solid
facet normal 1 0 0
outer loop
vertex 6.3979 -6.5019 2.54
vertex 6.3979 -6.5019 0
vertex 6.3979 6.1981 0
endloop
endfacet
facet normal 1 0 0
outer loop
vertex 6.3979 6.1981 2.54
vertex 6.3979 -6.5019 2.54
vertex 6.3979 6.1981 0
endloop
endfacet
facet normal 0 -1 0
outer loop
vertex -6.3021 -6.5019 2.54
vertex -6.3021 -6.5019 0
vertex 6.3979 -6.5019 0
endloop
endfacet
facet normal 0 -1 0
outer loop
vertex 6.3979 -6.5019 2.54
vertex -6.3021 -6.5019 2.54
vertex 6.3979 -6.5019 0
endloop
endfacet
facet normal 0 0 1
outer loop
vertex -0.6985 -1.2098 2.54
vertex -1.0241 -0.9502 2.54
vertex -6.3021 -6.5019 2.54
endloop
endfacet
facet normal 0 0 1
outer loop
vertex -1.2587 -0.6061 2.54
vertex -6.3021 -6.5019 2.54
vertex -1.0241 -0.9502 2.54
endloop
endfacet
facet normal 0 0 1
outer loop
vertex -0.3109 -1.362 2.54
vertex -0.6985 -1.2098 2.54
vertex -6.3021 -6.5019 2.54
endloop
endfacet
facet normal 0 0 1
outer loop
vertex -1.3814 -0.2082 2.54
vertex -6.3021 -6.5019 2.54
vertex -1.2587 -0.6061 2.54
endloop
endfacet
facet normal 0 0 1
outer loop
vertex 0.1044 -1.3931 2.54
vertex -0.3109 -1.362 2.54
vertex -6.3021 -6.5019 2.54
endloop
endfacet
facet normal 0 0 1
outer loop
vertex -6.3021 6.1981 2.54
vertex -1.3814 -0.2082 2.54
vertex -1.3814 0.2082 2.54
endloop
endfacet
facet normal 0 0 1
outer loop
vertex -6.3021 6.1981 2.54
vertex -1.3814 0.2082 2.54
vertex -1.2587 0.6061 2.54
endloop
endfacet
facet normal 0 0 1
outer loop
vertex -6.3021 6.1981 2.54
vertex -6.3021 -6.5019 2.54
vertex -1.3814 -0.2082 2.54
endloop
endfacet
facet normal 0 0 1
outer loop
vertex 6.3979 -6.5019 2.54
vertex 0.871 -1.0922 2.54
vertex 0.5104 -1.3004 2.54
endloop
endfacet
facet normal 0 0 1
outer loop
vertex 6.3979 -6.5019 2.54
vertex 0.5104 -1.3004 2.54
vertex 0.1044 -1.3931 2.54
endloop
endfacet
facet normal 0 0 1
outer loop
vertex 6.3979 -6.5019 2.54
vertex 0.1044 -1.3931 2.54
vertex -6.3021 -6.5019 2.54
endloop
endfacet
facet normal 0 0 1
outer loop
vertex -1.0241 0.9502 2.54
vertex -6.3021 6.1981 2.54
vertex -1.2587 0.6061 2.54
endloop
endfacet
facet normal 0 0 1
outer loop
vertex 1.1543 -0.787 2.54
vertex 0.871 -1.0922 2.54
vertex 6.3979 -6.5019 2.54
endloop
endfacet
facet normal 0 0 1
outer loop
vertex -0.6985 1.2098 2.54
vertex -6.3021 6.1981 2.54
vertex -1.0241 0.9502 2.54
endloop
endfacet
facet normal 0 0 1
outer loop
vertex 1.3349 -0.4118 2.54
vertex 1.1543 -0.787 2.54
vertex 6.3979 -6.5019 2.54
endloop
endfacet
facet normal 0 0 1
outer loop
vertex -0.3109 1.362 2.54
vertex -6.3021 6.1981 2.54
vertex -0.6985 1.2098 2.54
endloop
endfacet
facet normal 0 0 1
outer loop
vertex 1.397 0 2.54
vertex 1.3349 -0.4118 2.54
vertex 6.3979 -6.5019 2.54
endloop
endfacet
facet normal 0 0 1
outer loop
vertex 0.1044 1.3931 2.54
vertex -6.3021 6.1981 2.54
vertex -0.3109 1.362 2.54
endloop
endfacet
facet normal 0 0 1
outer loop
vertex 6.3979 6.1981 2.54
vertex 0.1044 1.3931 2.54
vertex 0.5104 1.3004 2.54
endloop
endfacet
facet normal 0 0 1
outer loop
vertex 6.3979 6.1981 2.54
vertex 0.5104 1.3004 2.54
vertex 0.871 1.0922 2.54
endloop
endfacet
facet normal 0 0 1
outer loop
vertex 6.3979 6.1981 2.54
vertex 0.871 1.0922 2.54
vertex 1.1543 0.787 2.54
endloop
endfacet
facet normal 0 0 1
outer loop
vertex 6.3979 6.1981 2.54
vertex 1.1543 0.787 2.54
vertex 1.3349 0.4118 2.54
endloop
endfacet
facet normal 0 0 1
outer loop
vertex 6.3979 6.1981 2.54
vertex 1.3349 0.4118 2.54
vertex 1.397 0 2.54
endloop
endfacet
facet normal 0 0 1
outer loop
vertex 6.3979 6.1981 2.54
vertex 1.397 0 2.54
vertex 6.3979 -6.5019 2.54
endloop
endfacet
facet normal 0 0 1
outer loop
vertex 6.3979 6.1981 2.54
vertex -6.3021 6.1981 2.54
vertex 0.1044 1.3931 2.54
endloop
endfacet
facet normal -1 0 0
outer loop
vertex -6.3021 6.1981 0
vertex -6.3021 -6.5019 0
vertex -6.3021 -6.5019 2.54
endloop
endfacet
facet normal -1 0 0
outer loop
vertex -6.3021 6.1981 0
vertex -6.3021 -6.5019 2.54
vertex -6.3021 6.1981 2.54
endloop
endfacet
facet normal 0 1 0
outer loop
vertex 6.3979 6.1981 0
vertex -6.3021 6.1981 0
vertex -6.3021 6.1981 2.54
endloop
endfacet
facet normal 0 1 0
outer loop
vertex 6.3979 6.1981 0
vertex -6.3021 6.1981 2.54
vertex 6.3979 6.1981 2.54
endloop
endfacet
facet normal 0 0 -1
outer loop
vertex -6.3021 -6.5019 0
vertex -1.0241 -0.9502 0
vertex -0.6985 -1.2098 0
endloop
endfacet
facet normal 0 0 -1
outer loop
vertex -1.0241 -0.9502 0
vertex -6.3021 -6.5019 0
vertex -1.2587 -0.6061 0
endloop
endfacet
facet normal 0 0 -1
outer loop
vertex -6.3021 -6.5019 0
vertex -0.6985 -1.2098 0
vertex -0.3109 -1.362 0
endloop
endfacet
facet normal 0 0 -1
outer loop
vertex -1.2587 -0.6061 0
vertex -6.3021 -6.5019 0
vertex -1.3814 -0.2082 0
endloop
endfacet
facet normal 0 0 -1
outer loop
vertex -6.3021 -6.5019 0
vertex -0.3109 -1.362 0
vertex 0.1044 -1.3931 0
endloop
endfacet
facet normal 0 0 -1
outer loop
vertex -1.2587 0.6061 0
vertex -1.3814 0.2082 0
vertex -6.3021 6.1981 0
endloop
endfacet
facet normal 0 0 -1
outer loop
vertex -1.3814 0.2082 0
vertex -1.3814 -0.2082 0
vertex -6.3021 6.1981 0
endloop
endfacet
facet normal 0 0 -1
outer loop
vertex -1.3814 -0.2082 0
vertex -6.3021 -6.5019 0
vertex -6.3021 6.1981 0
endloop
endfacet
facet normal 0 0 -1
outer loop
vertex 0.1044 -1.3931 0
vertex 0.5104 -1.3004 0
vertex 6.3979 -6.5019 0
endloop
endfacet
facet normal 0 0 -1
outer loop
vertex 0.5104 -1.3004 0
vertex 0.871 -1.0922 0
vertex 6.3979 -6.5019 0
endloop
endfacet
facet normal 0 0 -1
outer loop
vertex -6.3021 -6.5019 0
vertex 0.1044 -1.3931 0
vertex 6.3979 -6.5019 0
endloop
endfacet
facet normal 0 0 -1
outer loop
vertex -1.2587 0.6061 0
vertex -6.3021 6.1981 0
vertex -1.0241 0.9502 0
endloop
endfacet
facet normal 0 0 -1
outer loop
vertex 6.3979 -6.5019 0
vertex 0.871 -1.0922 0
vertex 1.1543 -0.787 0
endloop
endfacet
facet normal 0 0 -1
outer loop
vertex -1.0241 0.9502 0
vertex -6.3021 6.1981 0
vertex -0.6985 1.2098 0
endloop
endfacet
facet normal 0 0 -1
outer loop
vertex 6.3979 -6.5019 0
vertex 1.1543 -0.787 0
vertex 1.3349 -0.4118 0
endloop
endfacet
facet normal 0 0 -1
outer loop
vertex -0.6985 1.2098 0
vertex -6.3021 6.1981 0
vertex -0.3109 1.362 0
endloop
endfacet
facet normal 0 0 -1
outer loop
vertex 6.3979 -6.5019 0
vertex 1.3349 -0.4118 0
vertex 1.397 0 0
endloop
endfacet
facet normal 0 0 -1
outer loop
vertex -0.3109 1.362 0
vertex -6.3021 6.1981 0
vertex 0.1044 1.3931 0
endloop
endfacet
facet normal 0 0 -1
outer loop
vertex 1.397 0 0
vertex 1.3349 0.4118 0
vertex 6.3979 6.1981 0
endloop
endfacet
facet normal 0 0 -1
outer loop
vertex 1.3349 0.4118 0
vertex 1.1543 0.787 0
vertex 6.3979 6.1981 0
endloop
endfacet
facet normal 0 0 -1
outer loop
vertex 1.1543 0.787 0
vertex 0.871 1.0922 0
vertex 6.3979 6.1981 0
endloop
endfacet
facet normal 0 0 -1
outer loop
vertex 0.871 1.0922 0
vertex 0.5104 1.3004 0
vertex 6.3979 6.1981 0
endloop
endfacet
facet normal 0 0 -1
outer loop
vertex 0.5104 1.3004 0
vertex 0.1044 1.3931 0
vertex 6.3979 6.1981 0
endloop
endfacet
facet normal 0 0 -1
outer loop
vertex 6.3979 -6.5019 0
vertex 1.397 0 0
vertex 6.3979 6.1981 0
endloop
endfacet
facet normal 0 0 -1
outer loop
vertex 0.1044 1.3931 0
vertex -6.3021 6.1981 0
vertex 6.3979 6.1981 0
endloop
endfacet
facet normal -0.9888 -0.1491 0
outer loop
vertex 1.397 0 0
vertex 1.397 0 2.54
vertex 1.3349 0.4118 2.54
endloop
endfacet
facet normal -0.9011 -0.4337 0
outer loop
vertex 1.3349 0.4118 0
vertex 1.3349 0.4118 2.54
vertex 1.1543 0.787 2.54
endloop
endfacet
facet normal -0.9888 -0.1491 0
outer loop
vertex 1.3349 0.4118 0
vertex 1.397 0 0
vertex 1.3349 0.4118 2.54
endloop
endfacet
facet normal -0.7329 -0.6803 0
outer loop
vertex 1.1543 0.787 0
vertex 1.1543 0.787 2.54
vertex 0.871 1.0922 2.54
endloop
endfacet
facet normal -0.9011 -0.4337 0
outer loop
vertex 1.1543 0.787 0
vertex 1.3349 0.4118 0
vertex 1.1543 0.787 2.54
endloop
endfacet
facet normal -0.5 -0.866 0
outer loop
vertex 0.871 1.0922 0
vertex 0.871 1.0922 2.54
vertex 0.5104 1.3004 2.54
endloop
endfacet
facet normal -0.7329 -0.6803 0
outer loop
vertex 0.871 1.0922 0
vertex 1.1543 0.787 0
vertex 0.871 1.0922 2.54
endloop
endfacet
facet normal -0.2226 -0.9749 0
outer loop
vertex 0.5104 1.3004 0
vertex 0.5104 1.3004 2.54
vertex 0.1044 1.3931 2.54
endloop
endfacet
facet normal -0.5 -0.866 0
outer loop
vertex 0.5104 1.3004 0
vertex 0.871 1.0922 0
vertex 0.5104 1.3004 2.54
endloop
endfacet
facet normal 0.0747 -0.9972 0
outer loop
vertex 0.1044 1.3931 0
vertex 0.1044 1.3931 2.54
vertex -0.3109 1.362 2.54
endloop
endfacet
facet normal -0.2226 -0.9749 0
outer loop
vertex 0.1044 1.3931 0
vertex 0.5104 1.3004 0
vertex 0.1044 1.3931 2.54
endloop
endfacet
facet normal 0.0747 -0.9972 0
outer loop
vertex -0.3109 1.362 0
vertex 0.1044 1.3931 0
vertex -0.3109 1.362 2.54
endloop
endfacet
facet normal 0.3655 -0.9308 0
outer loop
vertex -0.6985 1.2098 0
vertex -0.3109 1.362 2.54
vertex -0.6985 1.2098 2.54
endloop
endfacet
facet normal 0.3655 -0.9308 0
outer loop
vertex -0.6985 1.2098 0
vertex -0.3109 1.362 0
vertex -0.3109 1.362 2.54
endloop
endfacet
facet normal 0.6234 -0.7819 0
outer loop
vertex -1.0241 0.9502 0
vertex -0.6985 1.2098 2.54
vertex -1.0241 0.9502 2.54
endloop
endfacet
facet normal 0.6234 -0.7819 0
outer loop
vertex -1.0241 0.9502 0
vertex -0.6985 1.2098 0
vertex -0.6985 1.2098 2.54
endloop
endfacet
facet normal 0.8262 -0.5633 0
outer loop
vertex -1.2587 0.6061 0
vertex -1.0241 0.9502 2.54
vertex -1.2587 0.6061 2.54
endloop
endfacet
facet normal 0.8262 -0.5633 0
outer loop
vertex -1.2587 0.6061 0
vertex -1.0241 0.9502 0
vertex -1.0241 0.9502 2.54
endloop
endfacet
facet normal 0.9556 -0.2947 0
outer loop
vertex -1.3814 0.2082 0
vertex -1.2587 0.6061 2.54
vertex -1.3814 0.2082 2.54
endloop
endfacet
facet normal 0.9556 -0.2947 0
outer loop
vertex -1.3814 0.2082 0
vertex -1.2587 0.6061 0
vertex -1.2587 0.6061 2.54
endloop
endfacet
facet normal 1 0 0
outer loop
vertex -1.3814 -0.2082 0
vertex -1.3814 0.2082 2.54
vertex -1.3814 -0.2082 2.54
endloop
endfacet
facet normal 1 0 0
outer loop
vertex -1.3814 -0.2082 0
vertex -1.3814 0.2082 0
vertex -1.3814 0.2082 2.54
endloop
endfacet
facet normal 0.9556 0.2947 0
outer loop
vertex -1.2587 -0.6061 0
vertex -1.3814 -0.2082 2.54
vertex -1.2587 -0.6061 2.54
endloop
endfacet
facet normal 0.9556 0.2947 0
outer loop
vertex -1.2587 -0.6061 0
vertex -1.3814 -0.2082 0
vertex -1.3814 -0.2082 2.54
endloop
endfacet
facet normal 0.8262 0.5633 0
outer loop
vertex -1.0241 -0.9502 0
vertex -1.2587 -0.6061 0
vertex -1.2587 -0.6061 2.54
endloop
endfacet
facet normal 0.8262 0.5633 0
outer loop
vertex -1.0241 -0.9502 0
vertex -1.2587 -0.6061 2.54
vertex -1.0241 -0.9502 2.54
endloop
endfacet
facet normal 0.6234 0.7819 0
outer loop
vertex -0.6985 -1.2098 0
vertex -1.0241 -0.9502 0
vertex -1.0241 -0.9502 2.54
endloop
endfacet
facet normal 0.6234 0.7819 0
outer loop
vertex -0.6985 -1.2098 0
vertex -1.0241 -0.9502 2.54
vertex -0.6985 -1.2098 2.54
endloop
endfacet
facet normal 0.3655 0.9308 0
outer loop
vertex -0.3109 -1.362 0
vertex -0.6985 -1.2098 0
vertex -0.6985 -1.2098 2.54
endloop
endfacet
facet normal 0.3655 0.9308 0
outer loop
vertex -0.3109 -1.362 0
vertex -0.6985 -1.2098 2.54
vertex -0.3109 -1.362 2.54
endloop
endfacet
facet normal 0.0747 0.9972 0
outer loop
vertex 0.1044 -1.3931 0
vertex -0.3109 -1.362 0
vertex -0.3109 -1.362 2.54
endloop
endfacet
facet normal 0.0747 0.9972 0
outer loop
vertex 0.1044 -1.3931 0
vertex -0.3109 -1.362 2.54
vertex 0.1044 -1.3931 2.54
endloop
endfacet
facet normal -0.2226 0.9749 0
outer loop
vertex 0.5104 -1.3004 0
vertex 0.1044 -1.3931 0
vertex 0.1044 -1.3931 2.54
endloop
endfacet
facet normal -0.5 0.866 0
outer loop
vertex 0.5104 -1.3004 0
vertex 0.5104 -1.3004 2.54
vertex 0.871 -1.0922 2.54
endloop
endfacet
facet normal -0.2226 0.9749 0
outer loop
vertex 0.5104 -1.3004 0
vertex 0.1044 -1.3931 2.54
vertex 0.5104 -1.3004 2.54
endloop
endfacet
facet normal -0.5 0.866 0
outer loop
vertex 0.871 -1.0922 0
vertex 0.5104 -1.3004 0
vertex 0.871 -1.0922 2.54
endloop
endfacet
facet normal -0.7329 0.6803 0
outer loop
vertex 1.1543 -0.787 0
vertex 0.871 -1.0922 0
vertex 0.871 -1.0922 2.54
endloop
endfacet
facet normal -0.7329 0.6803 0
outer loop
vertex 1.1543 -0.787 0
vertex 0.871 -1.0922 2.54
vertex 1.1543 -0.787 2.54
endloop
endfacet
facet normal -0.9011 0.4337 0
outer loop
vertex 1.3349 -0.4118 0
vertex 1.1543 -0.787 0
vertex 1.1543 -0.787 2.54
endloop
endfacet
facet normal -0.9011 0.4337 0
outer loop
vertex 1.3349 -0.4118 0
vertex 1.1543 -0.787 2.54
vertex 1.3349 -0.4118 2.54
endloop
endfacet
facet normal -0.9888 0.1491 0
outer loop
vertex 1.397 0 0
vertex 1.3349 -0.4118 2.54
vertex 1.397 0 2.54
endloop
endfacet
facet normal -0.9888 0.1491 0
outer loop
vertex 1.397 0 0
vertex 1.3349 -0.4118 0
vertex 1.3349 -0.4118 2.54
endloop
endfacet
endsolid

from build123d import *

# Parameters (mm, degrees)
F1_W     = 12.7
F1_H     = 12.7
F2_DEPTH = 2.54
F0_R     = 1.397
F3_DEPTH = 22.7076


with BuildPart() as f2:
    # F1 (on Top) → F2 (new body)
    with BuildSketch(Plane.XY):
        with Locations((0.047929, -0.151867)):
            Rectangle(F1_W, F1_H)
    extrude(amount=F2_DEPTH)

    # F0 (on Top) → F3 (cut)
    with BuildSketch(Plane.XY):
        Circle(F0_R)
    extrude(amount=F3_DEPTH, mode=Mode.SUBTRACT)


solid = f2.part
